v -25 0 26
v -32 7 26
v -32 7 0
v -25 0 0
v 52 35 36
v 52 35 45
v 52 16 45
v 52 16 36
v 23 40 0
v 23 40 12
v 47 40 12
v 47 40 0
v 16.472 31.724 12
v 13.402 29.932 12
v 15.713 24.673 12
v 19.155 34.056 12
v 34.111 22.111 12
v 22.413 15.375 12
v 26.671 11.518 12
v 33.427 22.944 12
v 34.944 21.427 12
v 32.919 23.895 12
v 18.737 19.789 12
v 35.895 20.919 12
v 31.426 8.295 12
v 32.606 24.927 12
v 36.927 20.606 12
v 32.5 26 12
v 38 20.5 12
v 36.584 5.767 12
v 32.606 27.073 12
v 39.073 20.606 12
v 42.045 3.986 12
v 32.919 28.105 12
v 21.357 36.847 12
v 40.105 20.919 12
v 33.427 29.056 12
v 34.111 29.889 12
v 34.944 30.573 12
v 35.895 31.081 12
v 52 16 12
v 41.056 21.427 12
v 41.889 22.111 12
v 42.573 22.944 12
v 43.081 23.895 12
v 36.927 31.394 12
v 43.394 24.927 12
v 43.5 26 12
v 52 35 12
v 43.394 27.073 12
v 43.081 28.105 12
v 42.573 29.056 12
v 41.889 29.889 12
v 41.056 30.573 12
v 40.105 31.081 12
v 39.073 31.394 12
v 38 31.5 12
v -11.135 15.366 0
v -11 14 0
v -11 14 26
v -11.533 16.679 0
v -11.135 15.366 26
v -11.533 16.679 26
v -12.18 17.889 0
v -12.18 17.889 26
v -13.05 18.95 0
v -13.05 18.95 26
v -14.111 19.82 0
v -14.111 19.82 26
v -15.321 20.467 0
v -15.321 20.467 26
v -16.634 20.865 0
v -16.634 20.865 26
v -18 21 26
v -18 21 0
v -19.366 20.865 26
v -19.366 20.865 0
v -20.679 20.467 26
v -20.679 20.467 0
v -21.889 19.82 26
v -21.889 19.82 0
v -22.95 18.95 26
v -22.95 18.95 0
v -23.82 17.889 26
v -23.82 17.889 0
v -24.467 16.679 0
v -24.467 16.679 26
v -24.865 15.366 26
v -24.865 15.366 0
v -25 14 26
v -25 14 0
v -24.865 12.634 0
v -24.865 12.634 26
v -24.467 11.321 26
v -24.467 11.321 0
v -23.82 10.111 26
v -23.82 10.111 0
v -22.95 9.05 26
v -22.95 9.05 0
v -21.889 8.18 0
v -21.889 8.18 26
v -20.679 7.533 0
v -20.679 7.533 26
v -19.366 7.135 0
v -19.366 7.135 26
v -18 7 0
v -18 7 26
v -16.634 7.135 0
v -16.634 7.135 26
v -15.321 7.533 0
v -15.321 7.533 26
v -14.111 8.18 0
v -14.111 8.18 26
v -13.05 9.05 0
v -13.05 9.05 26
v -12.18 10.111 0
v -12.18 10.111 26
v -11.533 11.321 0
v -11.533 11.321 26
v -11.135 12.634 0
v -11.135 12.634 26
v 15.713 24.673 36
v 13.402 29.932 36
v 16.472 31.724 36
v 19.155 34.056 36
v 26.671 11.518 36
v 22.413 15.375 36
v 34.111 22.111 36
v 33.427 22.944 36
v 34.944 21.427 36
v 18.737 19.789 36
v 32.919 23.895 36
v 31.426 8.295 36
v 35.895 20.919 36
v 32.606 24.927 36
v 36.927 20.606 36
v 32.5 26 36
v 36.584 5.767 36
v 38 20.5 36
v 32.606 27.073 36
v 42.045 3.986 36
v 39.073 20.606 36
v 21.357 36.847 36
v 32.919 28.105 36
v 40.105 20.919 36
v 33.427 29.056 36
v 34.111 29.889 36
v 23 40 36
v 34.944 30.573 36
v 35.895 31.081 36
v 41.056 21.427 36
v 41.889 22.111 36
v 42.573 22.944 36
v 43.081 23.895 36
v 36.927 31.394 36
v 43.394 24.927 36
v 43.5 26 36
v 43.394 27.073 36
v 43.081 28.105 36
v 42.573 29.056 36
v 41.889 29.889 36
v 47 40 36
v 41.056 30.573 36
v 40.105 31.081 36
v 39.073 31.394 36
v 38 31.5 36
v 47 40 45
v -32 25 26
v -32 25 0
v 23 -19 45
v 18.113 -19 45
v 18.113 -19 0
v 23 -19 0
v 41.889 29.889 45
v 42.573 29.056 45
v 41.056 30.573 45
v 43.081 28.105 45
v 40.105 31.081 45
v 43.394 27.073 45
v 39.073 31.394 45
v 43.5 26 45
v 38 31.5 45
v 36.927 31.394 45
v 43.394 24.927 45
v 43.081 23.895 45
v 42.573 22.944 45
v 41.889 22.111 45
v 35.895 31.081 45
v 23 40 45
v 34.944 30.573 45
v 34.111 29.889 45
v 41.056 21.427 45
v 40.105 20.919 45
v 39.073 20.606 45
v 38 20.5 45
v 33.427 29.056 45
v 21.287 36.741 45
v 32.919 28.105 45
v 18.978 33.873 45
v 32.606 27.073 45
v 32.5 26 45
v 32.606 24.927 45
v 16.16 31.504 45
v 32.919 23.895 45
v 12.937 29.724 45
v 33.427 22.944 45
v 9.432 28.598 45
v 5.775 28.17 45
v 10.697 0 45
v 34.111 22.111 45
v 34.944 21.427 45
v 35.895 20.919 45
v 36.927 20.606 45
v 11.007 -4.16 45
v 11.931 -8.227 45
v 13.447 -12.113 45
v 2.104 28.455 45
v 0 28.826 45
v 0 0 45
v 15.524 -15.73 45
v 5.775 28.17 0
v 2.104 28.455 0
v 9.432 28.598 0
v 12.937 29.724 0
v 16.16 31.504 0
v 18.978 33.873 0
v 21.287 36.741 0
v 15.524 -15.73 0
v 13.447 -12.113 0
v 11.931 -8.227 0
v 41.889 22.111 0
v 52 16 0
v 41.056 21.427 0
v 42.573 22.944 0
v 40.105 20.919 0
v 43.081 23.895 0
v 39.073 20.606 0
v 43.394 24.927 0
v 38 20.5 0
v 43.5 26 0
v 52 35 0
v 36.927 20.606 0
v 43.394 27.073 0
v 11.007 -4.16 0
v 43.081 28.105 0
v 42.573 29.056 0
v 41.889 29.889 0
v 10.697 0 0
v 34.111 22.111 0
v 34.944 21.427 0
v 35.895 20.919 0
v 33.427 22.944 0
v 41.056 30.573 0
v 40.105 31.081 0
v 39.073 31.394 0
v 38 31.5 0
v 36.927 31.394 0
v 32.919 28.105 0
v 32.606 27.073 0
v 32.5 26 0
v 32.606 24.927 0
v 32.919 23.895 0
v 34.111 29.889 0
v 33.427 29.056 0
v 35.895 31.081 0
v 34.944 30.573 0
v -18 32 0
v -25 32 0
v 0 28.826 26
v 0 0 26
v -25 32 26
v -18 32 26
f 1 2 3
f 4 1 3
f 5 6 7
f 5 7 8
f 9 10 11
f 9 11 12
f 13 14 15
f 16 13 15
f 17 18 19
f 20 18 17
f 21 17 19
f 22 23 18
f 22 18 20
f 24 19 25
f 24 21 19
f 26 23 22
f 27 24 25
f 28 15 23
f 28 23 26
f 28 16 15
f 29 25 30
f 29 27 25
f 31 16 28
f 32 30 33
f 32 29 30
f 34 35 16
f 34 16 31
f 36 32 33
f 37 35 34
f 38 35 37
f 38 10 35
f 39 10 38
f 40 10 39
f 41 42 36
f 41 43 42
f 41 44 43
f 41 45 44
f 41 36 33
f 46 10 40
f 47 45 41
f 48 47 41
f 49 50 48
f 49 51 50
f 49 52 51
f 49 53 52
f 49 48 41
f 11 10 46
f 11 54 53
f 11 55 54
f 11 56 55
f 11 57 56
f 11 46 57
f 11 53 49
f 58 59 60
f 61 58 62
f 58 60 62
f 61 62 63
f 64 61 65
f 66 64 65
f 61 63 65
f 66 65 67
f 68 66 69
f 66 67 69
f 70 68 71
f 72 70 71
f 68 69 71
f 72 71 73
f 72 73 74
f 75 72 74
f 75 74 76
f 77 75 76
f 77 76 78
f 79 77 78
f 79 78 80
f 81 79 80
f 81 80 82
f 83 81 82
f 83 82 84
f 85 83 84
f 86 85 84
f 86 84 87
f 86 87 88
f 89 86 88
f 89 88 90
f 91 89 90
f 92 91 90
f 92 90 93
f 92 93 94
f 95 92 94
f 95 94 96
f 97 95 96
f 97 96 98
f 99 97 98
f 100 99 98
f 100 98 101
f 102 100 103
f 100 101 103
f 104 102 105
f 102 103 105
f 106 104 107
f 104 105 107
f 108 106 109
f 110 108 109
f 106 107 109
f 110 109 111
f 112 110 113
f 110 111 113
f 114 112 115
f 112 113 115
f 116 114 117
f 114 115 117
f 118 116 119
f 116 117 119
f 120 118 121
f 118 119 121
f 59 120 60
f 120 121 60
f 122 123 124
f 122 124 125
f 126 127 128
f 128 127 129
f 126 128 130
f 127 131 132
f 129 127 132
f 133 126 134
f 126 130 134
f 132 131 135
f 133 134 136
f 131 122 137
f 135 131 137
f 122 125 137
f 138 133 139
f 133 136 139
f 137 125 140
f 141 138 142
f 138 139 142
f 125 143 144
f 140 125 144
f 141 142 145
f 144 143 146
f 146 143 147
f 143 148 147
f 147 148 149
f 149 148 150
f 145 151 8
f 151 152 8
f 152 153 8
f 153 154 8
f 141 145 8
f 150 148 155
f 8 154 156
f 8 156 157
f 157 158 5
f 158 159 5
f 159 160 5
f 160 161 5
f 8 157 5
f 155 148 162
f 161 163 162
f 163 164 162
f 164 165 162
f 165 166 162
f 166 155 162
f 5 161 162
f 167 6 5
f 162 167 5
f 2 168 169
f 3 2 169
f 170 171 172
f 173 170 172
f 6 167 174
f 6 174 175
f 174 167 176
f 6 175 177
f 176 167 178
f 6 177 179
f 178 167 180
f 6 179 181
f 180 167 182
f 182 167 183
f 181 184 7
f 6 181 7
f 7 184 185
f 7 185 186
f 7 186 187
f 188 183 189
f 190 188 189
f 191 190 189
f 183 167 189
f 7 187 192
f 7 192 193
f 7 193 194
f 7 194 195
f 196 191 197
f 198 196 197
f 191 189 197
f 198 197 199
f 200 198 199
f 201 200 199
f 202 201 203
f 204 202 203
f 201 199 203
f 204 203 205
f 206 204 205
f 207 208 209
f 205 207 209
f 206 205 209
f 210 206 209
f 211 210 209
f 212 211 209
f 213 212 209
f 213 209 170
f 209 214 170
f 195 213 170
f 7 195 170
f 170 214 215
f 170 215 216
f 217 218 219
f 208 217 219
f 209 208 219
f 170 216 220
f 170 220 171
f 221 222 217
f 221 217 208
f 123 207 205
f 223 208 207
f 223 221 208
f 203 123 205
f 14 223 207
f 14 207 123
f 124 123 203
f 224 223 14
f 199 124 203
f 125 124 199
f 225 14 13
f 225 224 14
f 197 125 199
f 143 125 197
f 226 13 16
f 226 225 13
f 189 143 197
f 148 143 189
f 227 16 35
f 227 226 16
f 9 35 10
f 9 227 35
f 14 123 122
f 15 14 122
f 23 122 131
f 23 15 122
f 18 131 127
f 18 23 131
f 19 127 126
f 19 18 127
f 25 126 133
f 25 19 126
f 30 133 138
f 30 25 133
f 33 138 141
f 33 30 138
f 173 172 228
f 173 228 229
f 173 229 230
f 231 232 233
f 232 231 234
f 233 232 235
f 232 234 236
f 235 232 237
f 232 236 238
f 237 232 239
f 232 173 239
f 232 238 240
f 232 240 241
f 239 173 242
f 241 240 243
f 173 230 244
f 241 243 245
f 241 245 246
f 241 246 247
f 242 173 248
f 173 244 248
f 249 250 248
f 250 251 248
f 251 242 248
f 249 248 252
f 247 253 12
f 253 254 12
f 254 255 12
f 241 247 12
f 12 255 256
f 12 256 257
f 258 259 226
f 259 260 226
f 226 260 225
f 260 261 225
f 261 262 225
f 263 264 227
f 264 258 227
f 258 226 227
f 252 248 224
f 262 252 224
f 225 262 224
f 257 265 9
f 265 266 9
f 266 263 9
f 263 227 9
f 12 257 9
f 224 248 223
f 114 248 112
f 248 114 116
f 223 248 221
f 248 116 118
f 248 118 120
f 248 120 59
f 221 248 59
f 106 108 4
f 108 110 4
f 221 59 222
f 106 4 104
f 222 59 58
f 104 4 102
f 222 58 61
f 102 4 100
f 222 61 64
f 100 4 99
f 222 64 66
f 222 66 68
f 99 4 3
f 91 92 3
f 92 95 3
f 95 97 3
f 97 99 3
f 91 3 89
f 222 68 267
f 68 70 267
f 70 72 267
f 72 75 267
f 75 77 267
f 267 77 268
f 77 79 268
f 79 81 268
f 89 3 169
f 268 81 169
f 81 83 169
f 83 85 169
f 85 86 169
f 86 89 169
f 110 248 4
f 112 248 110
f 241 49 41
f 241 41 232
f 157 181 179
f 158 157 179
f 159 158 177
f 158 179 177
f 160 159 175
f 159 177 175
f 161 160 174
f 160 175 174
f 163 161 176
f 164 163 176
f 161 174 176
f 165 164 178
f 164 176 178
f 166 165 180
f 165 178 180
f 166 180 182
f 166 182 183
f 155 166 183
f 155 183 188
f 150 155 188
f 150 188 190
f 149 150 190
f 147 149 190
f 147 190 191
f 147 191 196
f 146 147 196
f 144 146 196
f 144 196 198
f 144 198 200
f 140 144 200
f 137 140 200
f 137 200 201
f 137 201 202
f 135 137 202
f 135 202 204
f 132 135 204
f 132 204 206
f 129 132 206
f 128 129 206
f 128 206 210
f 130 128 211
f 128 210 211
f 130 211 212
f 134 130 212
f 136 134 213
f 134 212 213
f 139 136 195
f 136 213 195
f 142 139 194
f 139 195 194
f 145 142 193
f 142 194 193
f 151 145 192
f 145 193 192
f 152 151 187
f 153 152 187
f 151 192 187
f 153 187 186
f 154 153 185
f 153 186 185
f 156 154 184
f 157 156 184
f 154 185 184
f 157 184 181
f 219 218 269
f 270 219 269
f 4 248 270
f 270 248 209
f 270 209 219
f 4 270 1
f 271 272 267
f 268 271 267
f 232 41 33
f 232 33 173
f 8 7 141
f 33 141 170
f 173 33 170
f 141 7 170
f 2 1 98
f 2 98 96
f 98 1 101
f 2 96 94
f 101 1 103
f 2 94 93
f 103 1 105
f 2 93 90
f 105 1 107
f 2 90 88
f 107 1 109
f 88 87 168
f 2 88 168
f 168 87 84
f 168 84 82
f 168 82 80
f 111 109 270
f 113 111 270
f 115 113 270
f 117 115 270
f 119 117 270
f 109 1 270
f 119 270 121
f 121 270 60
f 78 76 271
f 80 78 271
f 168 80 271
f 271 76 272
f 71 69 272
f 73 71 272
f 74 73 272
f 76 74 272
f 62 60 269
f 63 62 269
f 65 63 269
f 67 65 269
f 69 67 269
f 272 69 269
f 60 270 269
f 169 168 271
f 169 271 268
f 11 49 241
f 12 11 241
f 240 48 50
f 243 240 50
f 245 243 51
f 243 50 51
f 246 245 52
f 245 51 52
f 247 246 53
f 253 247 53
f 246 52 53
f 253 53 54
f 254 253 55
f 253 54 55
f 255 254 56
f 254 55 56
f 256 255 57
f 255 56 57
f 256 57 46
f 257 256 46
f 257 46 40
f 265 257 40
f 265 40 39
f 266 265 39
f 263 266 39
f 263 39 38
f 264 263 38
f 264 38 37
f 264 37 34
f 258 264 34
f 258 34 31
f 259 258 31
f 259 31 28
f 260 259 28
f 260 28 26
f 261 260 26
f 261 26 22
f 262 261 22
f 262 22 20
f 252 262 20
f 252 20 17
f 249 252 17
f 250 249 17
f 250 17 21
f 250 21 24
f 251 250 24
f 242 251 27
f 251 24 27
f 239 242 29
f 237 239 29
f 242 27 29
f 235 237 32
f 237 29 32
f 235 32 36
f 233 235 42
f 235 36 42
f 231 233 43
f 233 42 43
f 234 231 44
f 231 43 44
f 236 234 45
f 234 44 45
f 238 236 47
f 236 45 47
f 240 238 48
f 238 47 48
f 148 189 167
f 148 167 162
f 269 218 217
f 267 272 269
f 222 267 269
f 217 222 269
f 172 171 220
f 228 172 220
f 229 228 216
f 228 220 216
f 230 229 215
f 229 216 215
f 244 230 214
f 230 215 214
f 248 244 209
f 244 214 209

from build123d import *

# Parameters (mm, degrees)
SKETCH1_W           = 26
SKETCH1_H           = 32
BOSS_EXTRUDE1_DEPTH = 32
SKETCH2_W           = 45
SKETCH2_H           = 40
SKETCH2_H_2         = 19
BOSS_EXTRUDE2_DEPTH = 52
CHAMFER1_SIZE       = 7
SKETCH3_R           = 7
CUT_EXTRUDE1_DEPTH  = 71.569115058
CHAMFER2_SIZE       = 5
SPLIT1_DEPTH        = 45
CUT_EXTRUDE2_DEPTH  = 52
CUT_EXTRUDE7_DEPTH  = 80.555012413
SKETCH8_R           = 41
CUT_EXTRUDE8_DEPTH  = 24
SKETCH9_R           = 5.5
CUT_EXTRUDE9_DEPTH  = 80.555012413


# Read off the part's stored shape, not the designer's step: Split1
with BuildPart() as part:
    # Sketch1 → Boss-Extrude1 (new body)
    with BuildSketch(Plane(origin=(0, 0, 0), x_dir=(0, 0, -1), z_dir=(1, 0, 0))):
        with Locations((-13, 16)):
            Rectangle(SKETCH1_W, SKETCH1_H)
    extrude(amount=-BOSS_EXTRUDE1_DEPTH)

    # Sketch2 → Boss-Extrude2 (add)
    with BuildSketch(Plane(origin=(0, 0, 0), x_dir=(0, 0, -1), z_dir=(1, 0, 0))):
        with Locations((-22.5, 20)):
            Rectangle(SKETCH2_W, SKETCH2_H)
        with Locations((-22.5, -9.5)):
            Rectangle(SKETCH2_W, SKETCH2_H_2)
    extrude(amount=BOSS_EXTRUDE2_DEPTH)

    # Chamfer1
    chamfer1_edges = [part.edges().sort_by_distance(p)[0] for p in [
        (-32, 0, 13),
        (-32, 32, 13),
    ]]
    chamfer(chamfer1_edges, length=CHAMFER1_SIZE)

    # Sketch3 → Cut-Extrude1 (cut, through all)
    with BuildSketch(Plane.XY.offset(26)):
        with Locations((-18, 14)):
            Circle(SKETCH3_R)
    extrude(amount=-CUT_EXTRUDE1_DEPTH, mode=Mode.SUBTRACT)

    # Chamfer2
    chamfer2_edges = [part.edges().sort_by_distance(p)[0] for p in [
        (52, 40, 22.5),
    ]]
    chamfer(chamfer2_edges, length=CHAMFER2_SIZE)

    # Split1 outline → Split1 (cut)
    with BuildSketch(Plane.XY):
        with BuildLine():
            ThreePointArc((2.104042352, 28.455114912), (14.591637328, 30.535902458), (23, 40))
            Line((23, 40), (0, 40))
            Line((0, 40), (0, 32))
            Line((0, 32), (-18, 32))
            Line((-18, 32), (2.104042352, 28.455114912))
        make_face()
    extrude(amount=SPLIT1_DEPTH, mode=Mode.SUBTRACT)

    # Sketch6 → Cut-Extrude2 (cut)
    with BuildSketch(Plane.XY.offset(45)):
        Polygon((52, -19), (52, 16), (23, -19), align=None)
    extrude(amount=-CUT_EXTRUDE2_DEPTH, mode=Mode.SUBTRACT)

    # Sketch7 → Cut-Extrude7 (cut, through all)
    with BuildSketch(Plane.XY.offset(45)):
        with BuildLine():
            ThreePointArc((18.113465426, -19), (12.616803089, -10.198093068), (10.696969697, 0))
            Line((10.696969697, 0), (0, 0))
            Line((0, 0), (0, -19))
            Line((0, -19), (18.113465426, -19))
        make_face()
    extrude(amount=-CUT_EXTRUDE7_DEPTH, mode=Mode.SUBTRACT)

    # Sketch8 → Cut-Extrude8 (cut)
    with BuildSketch(Plane.XY.offset(12)):
        with Locations((52, 43.758742169)):
            Circle(SKETCH8_R)
    extrude(amount=CUT_EXTRUDE8_DEPTH, mode=Mode.SUBTRACT)

    # Sketch9 → Cut-Extrude9 (cut, through all)
    with BuildSketch(Plane.XY.offset(45)):
        with Locations((38, 26)):
            Circle(SKETCH9_R)
    extrude(amount=-CUT_EXTRUDE9_DEPTH, mode=Mode.SUBTRACT)


solid = part.part
